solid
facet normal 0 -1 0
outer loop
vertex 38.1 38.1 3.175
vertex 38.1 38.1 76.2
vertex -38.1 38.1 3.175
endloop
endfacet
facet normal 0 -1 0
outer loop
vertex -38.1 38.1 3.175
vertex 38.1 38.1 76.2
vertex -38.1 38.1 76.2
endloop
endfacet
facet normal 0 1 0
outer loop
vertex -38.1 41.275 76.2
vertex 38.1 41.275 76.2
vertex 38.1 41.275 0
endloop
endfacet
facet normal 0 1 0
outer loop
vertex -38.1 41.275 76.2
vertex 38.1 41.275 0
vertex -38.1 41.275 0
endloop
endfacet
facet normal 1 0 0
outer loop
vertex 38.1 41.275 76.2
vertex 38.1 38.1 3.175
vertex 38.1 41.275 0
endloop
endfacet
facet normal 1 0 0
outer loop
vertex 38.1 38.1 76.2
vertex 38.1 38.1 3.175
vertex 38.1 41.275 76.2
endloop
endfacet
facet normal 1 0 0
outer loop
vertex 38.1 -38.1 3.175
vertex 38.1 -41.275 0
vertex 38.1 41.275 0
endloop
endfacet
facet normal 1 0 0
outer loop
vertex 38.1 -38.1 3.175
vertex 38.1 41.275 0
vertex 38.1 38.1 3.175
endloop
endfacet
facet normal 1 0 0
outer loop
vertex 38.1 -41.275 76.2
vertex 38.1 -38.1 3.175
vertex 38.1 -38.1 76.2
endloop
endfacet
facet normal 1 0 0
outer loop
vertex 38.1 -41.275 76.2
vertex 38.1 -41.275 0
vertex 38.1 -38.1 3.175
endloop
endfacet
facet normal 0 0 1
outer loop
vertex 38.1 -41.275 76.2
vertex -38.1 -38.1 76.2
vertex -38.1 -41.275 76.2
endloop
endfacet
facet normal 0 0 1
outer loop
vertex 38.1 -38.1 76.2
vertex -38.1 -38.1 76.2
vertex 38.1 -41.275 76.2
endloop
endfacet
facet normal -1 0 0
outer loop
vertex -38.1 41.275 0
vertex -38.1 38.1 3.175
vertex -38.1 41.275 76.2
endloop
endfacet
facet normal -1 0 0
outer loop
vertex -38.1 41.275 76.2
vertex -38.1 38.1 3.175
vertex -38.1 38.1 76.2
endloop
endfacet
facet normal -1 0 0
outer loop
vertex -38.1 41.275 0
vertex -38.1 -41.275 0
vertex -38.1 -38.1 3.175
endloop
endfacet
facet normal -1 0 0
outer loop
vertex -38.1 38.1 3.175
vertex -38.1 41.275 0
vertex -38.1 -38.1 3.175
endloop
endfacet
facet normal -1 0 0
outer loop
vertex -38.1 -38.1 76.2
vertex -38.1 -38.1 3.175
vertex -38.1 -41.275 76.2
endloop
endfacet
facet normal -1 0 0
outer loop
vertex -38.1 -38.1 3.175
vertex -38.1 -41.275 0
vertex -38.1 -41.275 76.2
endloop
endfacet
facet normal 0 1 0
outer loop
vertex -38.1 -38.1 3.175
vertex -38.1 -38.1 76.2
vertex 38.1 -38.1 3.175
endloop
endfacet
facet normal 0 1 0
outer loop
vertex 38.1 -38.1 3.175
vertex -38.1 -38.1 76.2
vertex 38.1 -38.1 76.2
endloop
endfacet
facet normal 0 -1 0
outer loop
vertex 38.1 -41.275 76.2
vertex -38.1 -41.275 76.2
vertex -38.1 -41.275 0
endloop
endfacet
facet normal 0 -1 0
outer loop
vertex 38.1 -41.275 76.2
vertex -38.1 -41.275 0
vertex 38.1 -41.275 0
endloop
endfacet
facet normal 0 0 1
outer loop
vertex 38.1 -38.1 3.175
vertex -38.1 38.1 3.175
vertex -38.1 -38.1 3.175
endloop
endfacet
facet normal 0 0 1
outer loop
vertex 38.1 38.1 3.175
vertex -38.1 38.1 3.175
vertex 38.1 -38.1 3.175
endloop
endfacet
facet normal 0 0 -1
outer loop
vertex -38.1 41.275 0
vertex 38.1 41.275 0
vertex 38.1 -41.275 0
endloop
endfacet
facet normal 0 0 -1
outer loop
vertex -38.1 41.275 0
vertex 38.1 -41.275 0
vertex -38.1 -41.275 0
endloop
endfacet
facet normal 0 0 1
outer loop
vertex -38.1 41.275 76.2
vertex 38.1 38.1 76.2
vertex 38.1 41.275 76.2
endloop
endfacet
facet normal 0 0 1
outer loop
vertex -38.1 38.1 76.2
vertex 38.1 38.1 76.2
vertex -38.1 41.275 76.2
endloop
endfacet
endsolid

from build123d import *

# Parameters (mm, degrees)
F0_W     = 76.2
F0_H     = 76.2
F1_DEPTH = 3.175
F2_W     = 76.2
F2_H     = 73.025
F3_DEPTH = 3.175
F2_H_2   = 76.2
F4_DEPTH = 3.175
F5_W     = 76.2
F5_H     = 76.2
F6_DEPTH = 3.175


# Not quite as in the source:
# - a length typed as a fraction of an inch, garbled in the dataset ("3 / 203.2 mm" for 3/8 in), is restored


with BuildPart() as f1:
    # F0 (on Top) → F1 (new body)
    with BuildSketch(Plane.XY):
        Rectangle(F0_W, F0_H)
    extrude(amount=F1_DEPTH)

    # F2 (on face) → F3 (join)
    with BuildSketch(Plane.XZ.offset(38.1)):
        with Locations((0, 39.6875)):
            Rectangle(F2_W, F2_H)
    extrude(amount=F3_DEPTH)

    # F2 (on face) → F4 (join)
    with BuildSketch(Plane.XZ.offset(38.1)):
        with Locations((0, 38.1)):
            Rectangle(F2_W, F2_H_2)
    extrude(amount=F4_DEPTH)

    # F5 (on face) → F6 (join)
    with BuildSketch(Plane(origin=(0, 38.1, 0), x_dir=(-1, 0, 0), z_dir=(0, 1, 0))):
        with Locations((0, 38.1)):
            Rectangle(F5_W, F5_H)
    extrude(amount=F6_DEPTH)


solid = f1.part
